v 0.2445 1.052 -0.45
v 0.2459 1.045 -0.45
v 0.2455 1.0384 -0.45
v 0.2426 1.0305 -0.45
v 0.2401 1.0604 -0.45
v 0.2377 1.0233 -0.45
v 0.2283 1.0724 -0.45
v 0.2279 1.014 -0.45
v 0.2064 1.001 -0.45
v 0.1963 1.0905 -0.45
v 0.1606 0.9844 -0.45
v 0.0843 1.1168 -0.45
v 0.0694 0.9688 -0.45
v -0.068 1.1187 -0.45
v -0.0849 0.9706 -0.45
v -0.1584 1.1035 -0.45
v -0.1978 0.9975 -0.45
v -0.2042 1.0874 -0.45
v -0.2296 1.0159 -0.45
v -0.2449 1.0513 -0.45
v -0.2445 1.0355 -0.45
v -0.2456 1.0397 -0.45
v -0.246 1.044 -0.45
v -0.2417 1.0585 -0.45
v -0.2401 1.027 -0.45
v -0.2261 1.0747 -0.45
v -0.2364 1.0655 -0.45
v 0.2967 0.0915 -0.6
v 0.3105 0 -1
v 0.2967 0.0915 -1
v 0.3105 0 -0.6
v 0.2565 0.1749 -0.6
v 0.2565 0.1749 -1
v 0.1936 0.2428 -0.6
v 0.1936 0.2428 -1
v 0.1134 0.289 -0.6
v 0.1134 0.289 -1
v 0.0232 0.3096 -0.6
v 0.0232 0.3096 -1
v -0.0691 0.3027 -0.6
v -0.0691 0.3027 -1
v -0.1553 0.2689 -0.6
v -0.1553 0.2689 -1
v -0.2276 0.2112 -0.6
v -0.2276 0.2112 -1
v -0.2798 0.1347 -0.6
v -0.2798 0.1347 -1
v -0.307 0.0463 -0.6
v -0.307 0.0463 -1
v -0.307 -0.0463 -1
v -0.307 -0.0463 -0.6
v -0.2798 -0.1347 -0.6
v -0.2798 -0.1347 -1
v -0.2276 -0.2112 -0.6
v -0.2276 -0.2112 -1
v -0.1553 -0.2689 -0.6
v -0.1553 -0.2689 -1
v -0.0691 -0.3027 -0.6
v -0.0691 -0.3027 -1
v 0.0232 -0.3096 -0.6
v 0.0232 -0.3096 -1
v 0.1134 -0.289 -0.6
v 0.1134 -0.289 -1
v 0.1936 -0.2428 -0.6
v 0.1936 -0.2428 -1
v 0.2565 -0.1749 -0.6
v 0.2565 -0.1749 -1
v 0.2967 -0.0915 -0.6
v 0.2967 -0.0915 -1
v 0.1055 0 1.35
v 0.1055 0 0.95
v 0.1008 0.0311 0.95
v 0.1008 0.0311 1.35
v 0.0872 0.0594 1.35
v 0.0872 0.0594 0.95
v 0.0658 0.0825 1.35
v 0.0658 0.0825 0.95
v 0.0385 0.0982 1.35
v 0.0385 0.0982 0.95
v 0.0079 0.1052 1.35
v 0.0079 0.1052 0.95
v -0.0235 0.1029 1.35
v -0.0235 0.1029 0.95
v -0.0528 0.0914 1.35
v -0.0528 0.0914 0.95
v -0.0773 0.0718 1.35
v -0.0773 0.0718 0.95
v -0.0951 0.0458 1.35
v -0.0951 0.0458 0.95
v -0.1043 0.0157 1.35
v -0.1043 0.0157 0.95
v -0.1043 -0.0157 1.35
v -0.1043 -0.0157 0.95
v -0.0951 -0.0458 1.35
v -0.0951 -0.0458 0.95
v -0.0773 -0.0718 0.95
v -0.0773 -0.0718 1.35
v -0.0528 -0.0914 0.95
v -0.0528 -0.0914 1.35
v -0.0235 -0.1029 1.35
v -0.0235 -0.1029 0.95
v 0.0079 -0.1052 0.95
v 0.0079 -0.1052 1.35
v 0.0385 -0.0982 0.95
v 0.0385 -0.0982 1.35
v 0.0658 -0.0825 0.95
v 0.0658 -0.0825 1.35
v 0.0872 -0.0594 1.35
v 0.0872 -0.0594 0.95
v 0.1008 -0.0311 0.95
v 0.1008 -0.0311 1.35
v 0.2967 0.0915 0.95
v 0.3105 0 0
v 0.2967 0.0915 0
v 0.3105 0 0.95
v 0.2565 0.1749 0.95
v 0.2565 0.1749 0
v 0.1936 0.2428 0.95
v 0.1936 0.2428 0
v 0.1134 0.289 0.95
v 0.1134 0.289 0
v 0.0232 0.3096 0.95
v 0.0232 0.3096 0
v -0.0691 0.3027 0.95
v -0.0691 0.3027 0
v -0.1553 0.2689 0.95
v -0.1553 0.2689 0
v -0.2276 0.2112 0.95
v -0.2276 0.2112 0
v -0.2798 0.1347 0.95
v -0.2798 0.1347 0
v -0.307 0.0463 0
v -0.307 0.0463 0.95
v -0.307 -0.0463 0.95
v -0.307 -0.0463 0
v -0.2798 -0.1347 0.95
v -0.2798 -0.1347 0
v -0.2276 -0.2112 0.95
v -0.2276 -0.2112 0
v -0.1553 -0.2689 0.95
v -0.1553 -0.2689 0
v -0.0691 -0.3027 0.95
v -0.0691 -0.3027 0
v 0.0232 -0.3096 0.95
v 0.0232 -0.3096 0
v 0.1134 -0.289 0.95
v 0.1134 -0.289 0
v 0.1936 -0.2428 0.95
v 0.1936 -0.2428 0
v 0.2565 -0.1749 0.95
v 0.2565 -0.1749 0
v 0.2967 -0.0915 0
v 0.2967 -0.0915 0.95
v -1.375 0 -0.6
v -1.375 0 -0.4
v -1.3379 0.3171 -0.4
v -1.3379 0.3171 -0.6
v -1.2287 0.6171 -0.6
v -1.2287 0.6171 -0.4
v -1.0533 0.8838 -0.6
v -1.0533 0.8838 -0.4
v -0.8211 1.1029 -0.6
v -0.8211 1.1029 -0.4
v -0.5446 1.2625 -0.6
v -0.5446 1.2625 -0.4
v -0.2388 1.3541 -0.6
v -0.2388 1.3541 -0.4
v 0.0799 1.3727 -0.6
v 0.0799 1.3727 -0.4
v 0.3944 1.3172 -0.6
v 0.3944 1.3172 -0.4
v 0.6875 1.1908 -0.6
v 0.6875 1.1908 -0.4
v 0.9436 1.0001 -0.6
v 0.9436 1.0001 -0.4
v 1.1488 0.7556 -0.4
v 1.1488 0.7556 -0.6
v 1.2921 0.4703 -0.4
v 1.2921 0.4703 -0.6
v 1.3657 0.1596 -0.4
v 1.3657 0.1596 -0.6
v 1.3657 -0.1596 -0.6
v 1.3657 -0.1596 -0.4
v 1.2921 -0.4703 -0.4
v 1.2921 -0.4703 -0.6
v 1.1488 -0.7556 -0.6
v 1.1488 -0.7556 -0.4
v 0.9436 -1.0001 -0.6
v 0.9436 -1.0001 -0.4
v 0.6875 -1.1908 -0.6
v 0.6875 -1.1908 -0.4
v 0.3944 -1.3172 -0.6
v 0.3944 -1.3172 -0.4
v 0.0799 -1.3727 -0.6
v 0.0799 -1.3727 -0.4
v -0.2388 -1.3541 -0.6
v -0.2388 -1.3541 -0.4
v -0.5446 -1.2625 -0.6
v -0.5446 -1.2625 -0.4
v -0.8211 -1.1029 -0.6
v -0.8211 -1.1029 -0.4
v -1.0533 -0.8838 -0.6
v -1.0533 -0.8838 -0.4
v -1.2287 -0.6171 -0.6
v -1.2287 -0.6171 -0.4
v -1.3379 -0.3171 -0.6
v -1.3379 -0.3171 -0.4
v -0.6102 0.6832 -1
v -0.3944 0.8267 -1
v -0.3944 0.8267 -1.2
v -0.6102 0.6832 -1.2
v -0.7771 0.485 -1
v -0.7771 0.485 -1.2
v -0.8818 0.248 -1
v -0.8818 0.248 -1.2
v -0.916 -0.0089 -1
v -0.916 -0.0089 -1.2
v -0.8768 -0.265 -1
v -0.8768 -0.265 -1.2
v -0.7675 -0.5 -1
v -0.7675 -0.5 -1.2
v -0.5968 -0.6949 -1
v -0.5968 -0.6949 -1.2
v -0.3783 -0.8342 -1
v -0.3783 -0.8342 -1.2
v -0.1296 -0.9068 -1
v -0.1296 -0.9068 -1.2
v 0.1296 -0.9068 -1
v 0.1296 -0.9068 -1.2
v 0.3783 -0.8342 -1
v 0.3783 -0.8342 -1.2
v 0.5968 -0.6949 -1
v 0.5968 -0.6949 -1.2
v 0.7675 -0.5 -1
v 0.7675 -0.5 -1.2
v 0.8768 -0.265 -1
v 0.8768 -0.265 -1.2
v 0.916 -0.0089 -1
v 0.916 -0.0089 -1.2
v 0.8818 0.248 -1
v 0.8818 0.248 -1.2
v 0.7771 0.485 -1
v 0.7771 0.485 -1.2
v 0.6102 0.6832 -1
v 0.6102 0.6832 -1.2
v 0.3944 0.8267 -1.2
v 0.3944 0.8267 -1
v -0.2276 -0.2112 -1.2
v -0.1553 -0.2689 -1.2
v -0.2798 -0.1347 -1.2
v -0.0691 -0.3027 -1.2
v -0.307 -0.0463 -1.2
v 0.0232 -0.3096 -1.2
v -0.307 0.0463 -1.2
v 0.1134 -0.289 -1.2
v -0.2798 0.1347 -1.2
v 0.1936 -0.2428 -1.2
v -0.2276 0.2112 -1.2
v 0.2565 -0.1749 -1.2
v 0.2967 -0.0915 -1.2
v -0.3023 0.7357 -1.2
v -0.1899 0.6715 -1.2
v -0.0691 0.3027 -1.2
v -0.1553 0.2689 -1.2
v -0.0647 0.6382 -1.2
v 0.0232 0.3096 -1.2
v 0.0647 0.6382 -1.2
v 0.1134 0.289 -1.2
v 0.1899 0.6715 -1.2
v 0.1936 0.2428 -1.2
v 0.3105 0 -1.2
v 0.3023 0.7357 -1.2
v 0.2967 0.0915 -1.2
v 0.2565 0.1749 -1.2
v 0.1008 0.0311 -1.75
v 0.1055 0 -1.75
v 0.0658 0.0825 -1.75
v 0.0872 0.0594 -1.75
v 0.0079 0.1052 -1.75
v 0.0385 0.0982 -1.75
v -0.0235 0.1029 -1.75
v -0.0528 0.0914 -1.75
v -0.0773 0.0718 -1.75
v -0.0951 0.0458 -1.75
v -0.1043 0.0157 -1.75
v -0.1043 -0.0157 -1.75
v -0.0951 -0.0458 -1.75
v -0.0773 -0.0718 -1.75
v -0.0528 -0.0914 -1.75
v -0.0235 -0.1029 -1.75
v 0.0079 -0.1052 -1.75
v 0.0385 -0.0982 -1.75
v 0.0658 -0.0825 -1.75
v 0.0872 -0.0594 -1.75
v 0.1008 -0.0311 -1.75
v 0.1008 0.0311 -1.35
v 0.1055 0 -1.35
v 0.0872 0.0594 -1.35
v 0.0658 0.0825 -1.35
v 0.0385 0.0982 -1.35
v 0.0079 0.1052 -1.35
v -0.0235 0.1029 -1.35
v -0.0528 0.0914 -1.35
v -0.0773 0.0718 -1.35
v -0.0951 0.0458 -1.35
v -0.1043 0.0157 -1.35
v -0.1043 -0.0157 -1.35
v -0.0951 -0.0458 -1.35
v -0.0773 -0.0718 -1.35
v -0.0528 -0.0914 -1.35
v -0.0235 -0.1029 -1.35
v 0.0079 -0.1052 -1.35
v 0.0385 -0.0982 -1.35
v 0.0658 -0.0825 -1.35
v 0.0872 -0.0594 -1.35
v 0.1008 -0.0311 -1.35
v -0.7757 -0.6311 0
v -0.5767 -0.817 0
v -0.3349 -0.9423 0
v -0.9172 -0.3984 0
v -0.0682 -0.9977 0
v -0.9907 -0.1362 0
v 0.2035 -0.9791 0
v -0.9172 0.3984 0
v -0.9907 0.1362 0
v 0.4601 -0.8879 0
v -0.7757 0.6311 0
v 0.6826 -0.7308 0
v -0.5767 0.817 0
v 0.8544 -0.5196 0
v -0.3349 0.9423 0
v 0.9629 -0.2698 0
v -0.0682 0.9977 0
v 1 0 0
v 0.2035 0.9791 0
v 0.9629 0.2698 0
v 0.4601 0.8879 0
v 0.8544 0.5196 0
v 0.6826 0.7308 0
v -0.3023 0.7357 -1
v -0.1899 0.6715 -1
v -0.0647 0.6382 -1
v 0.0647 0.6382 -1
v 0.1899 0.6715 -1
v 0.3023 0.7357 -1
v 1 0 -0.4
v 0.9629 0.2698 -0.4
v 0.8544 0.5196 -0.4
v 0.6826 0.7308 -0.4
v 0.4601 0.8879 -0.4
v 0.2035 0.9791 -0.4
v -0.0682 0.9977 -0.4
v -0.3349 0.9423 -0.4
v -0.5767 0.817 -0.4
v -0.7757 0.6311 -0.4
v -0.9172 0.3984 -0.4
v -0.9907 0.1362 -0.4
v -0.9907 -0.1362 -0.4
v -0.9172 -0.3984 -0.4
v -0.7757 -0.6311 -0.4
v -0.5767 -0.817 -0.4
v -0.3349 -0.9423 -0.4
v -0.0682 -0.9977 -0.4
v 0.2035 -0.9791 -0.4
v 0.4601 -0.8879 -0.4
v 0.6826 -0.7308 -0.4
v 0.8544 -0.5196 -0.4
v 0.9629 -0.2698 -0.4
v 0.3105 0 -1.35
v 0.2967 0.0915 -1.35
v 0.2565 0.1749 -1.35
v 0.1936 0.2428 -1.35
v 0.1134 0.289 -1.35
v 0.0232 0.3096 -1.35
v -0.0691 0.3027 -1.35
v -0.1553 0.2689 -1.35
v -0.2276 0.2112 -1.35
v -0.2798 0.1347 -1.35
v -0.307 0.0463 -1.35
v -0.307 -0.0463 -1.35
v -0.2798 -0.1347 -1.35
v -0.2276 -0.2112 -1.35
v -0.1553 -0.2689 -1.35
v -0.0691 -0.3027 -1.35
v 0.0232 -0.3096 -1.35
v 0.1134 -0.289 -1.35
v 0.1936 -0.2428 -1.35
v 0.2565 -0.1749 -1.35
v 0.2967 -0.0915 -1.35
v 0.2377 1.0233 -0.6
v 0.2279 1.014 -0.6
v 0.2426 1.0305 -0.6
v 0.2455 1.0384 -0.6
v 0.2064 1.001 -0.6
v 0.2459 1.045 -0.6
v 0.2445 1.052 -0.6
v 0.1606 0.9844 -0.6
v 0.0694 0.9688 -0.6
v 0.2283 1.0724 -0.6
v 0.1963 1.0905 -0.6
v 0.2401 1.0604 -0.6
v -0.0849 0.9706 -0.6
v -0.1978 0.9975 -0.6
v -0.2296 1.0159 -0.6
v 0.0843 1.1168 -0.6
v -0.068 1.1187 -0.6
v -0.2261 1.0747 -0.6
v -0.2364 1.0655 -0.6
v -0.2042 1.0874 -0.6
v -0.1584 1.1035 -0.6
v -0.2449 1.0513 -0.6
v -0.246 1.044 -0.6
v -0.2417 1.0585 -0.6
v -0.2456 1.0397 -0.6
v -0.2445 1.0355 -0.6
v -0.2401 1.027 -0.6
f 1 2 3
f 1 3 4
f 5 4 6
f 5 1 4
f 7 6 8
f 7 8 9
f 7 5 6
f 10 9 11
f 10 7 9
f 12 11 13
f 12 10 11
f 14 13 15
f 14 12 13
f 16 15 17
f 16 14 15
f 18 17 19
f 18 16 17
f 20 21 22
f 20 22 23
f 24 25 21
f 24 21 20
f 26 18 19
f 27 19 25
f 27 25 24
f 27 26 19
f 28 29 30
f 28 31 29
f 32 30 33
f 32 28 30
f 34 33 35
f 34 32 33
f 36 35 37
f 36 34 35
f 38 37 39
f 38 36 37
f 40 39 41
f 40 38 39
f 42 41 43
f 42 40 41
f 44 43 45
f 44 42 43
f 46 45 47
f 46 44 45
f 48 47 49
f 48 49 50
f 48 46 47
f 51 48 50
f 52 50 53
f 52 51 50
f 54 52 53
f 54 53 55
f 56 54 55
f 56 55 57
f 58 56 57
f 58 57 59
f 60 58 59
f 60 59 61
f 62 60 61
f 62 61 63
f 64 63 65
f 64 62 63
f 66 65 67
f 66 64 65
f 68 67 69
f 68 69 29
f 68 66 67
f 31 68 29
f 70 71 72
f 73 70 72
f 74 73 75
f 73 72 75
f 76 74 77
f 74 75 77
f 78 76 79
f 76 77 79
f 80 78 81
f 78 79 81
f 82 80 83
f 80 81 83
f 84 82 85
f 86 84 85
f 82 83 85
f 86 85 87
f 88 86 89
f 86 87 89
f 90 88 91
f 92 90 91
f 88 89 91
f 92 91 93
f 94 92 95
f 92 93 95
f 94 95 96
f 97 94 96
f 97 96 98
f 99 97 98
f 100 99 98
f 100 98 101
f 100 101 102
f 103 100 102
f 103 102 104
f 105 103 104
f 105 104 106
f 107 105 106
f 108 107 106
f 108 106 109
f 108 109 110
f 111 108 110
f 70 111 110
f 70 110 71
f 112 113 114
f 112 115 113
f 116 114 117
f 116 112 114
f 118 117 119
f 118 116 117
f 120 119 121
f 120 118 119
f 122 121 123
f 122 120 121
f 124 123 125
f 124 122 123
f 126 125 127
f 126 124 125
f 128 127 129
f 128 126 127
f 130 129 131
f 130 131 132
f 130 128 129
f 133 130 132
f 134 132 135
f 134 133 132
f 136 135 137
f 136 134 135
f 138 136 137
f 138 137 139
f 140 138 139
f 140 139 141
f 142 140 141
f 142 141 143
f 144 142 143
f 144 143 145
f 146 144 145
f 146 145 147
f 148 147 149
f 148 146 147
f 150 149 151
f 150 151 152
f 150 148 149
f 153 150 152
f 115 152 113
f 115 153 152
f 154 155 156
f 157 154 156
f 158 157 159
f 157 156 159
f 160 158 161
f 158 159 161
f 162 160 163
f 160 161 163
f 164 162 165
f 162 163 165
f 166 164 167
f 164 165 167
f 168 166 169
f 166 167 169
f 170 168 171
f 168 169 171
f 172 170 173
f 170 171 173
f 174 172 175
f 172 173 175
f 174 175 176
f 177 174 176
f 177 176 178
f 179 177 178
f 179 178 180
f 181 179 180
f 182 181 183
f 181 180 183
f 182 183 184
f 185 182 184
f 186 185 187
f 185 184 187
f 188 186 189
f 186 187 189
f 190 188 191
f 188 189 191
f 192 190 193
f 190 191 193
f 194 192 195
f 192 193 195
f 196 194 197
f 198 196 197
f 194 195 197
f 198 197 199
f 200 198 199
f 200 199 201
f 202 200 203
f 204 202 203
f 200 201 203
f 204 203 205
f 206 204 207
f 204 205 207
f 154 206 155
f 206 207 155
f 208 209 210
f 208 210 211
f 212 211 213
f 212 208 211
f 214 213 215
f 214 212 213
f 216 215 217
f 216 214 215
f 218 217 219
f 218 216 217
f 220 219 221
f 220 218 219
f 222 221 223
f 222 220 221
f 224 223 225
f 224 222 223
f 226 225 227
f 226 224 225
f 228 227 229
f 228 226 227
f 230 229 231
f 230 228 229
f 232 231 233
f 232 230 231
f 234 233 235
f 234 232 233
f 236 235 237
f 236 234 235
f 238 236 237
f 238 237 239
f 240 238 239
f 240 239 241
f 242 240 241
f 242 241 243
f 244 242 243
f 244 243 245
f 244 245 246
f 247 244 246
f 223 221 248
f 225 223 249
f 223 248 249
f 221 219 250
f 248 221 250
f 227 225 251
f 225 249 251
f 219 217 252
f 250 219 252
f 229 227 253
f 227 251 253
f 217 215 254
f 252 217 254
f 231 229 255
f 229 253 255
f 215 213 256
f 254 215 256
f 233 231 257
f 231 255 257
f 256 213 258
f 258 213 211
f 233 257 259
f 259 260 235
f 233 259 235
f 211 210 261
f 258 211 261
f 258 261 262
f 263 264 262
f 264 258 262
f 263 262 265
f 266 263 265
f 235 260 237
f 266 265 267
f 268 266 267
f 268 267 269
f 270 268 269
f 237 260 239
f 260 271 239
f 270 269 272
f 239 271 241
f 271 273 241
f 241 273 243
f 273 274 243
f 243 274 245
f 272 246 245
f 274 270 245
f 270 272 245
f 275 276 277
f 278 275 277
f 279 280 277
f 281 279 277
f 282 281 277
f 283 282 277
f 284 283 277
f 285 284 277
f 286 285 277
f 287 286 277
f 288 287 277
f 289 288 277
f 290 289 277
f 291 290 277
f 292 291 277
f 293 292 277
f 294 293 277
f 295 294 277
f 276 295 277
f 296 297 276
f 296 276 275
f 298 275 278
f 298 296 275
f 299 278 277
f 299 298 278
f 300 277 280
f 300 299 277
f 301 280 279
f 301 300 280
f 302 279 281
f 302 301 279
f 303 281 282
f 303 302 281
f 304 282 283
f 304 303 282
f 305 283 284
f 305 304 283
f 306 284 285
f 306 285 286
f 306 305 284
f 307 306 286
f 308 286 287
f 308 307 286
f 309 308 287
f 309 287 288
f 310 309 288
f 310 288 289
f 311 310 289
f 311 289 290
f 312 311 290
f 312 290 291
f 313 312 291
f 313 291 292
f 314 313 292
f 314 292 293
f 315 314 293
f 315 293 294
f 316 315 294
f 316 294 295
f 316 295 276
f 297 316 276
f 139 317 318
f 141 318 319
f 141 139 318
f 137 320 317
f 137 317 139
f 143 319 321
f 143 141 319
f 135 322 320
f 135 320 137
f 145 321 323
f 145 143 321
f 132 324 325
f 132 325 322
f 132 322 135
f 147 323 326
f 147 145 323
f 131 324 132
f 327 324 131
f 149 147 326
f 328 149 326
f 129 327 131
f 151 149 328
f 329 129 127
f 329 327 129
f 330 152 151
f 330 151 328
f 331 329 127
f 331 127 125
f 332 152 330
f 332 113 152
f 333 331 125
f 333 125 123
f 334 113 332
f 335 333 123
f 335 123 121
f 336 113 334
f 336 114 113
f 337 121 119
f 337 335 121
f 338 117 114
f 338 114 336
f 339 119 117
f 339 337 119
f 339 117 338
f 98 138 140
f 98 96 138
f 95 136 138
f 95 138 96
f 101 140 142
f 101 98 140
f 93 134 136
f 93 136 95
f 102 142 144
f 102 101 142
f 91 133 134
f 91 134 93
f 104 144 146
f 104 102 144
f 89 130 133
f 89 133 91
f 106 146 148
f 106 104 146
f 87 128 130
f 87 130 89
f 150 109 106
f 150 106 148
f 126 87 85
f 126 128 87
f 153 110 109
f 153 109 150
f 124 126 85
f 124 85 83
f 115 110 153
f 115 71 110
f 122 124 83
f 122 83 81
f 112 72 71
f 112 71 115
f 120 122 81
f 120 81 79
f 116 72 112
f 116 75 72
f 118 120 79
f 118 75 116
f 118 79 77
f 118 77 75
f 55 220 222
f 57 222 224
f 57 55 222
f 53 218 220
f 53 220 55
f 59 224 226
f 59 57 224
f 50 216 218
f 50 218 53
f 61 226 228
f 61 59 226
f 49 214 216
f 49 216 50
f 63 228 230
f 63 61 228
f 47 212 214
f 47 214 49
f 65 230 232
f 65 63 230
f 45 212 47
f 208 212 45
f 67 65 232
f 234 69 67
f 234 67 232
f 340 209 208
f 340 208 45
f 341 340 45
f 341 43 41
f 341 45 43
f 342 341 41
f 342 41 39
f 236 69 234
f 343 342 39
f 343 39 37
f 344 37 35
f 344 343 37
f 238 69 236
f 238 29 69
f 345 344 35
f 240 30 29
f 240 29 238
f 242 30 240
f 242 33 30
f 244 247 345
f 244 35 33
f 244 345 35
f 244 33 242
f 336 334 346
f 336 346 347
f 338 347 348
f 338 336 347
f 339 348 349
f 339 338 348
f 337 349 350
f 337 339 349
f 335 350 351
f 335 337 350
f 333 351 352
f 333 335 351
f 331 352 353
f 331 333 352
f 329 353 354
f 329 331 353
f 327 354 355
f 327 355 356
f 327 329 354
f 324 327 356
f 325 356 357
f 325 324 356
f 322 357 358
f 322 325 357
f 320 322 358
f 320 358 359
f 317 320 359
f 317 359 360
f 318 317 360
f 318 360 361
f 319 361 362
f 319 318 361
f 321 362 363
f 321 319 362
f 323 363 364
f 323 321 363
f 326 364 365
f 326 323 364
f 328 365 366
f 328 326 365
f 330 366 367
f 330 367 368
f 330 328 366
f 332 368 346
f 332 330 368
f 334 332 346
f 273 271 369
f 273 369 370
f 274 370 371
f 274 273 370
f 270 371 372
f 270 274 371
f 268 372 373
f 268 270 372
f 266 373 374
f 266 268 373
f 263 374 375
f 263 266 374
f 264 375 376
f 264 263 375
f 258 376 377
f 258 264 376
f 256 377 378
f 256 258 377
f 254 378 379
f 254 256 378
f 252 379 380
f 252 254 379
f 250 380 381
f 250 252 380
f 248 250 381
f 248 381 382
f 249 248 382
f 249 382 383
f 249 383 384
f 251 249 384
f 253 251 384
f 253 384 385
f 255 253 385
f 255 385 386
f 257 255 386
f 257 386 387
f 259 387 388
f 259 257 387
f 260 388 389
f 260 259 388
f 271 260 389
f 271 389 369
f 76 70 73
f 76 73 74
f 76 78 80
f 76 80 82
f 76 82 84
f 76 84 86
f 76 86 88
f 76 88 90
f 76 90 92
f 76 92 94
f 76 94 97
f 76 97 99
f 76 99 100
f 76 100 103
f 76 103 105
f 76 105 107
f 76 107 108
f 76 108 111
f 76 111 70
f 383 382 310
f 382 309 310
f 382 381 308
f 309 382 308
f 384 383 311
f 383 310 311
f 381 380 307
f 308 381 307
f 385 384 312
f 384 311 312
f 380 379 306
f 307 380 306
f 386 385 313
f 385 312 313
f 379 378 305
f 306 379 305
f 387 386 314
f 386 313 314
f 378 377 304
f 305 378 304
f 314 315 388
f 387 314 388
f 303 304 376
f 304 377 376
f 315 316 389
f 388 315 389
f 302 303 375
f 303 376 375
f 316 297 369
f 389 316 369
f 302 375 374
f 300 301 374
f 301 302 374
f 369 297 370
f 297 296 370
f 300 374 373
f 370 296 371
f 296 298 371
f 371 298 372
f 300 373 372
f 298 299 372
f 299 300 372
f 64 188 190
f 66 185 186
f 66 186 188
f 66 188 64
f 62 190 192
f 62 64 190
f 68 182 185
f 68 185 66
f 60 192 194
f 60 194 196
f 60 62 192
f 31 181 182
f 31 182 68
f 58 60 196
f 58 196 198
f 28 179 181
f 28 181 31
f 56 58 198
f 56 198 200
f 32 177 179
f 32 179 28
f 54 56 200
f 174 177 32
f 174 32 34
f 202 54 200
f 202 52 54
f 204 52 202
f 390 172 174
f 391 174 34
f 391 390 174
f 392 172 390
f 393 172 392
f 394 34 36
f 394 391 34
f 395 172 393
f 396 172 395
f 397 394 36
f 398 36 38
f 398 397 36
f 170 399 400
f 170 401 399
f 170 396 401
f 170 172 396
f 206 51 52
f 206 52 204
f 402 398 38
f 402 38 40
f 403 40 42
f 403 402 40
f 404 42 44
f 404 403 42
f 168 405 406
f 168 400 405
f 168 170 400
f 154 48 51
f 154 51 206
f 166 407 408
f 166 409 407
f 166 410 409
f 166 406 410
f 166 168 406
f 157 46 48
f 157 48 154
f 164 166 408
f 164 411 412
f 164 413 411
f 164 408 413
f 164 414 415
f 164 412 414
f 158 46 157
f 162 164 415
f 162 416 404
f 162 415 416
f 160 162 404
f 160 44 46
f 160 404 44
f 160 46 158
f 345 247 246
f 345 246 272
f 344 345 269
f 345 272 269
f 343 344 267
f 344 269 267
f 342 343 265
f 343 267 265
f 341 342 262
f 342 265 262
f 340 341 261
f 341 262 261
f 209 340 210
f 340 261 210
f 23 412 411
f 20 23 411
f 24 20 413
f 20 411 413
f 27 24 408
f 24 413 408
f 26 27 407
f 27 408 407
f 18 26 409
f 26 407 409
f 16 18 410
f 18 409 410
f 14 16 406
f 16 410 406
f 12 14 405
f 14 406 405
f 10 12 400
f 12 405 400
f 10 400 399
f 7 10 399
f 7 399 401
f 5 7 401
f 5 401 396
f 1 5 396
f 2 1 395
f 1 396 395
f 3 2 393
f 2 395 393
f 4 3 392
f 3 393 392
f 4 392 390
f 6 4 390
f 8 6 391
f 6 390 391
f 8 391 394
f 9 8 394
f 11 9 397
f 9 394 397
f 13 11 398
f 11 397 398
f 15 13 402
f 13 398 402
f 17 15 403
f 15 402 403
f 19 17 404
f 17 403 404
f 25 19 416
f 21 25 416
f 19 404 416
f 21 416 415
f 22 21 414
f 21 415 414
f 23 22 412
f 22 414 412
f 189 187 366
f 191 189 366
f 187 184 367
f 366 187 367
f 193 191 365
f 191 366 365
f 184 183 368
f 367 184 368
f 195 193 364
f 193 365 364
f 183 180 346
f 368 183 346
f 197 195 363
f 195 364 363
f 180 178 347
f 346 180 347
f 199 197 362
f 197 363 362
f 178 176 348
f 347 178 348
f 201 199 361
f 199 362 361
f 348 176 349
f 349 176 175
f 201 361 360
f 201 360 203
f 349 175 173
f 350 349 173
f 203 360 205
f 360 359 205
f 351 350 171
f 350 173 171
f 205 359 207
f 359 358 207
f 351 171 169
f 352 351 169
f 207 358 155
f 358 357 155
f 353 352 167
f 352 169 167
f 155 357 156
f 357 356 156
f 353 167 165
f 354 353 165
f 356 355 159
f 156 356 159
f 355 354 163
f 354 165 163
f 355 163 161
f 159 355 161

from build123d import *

# Parameters (mm, degrees)
SKETCH1_R                = 0.3105
BOSS_EXTRUDE1_DEPTH      = 0.95
BOSS_EXTRUDE1_DEPTH_BACK = 1.35
SKETCH2_R                = 0.1055
BOSS_EXTRUDE2_DEPTH      = 1.35
SKETCH2_2_R              = 0.1055
BOSS_EXTRUDE3_DEPTH      = 1.75
SKETCH3_R                = 1
BOSS_EXTRUDE4_DEPTH      = 0.4
SKETCH4_R                = 1.375
BOSS_EXTRUDE5_DEPTH      = 0.2
BOSS_EXTRUDE6_START      = -1
SKETCH5_R                = 0.916
BOSS_EXTRUDE6_DEPTH      = 0.2
SKETCH6_R                = 0.5
CUT_EXTRUDE1_DEPTH       = 0.2
SKETCH7_RX               = 0.246
SKETCH7_RY               = 0.078
CUT_EXTRUDE2_DEPTH       = 0.15


with BuildPart() as part:
    # Sketch1 → Boss-Extrude1 (new body, two sides)
    with BuildSketch(Plane.XY) as boss_extrude1_sk:
        Circle(SKETCH1_R)
    extrude(amount=BOSS_EXTRUDE1_DEPTH)
    extrude(boss_extrude1_sk.sketch, amount=-BOSS_EXTRUDE1_DEPTH_BACK)

    # Sketch2 → Boss-Extrude2 (add)
    with BuildSketch(Plane.XY):
        Circle(SKETCH2_R)
    extrude(amount=BOSS_EXTRUDE2_DEPTH)

    # Sketch2<2> → Boss-Extrude3 (add)
    with BuildSketch(Plane.XY):
        Circle(SKETCH2_2_R)
    extrude(amount=-BOSS_EXTRUDE3_DEPTH)

    # Sketch3 → Boss-Extrude4 (add)
    with BuildSketch(Plane.XY):
        Circle(SKETCH3_R)
    extrude(amount=-BOSS_EXTRUDE4_DEPTH)

    # Sketch4 → Boss-Extrude5 (add)
    with BuildSketch(Plane(origin=(0, 0, -0.4), x_dir=(-1, 0, 0), z_dir=(0, 0, -1))):
        Circle(SKETCH4_R)
    extrude(amount=BOSS_EXTRUDE5_DEPTH)

    # Sketch5 → Boss-Extrude6 (add)
    with BuildSketch(Plane.XY.offset(BOSS_EXTRUDE6_START)):
        Circle(SKETCH5_R)
    extrude(amount=-BOSS_EXTRUDE6_DEPTH)

    # Sketch6 → Cut-Extrude1 (cut)
    with BuildSketch(Plane(origin=(0, 0, -1.2), x_dir=(-1, 0, 0), z_dir=(0, 0, -1))):
        with Locations((0, 1.134)):
            Circle(SKETCH6_R)
    extrude(amount=-CUT_EXTRUDE1_DEPTH, mode=Mode.SUBTRACT)

    # Sketch7 → Cut-Extrude2 (cut)
    with BuildSketch(Plane(origin=(0, 0, -0.6), x_dir=(-1, 0, 0), z_dir=(0, 0, -1))):
        with Locations(Location((0, 1.043666416), (0, 0, 0.077694932))):
            Ellipse(SKETCH7_RX, SKETCH7_RY)
    extrude(amount=-CUT_EXTRUDE2_DEPTH, mode=Mode.SUBTRACT)


solid = part.part
